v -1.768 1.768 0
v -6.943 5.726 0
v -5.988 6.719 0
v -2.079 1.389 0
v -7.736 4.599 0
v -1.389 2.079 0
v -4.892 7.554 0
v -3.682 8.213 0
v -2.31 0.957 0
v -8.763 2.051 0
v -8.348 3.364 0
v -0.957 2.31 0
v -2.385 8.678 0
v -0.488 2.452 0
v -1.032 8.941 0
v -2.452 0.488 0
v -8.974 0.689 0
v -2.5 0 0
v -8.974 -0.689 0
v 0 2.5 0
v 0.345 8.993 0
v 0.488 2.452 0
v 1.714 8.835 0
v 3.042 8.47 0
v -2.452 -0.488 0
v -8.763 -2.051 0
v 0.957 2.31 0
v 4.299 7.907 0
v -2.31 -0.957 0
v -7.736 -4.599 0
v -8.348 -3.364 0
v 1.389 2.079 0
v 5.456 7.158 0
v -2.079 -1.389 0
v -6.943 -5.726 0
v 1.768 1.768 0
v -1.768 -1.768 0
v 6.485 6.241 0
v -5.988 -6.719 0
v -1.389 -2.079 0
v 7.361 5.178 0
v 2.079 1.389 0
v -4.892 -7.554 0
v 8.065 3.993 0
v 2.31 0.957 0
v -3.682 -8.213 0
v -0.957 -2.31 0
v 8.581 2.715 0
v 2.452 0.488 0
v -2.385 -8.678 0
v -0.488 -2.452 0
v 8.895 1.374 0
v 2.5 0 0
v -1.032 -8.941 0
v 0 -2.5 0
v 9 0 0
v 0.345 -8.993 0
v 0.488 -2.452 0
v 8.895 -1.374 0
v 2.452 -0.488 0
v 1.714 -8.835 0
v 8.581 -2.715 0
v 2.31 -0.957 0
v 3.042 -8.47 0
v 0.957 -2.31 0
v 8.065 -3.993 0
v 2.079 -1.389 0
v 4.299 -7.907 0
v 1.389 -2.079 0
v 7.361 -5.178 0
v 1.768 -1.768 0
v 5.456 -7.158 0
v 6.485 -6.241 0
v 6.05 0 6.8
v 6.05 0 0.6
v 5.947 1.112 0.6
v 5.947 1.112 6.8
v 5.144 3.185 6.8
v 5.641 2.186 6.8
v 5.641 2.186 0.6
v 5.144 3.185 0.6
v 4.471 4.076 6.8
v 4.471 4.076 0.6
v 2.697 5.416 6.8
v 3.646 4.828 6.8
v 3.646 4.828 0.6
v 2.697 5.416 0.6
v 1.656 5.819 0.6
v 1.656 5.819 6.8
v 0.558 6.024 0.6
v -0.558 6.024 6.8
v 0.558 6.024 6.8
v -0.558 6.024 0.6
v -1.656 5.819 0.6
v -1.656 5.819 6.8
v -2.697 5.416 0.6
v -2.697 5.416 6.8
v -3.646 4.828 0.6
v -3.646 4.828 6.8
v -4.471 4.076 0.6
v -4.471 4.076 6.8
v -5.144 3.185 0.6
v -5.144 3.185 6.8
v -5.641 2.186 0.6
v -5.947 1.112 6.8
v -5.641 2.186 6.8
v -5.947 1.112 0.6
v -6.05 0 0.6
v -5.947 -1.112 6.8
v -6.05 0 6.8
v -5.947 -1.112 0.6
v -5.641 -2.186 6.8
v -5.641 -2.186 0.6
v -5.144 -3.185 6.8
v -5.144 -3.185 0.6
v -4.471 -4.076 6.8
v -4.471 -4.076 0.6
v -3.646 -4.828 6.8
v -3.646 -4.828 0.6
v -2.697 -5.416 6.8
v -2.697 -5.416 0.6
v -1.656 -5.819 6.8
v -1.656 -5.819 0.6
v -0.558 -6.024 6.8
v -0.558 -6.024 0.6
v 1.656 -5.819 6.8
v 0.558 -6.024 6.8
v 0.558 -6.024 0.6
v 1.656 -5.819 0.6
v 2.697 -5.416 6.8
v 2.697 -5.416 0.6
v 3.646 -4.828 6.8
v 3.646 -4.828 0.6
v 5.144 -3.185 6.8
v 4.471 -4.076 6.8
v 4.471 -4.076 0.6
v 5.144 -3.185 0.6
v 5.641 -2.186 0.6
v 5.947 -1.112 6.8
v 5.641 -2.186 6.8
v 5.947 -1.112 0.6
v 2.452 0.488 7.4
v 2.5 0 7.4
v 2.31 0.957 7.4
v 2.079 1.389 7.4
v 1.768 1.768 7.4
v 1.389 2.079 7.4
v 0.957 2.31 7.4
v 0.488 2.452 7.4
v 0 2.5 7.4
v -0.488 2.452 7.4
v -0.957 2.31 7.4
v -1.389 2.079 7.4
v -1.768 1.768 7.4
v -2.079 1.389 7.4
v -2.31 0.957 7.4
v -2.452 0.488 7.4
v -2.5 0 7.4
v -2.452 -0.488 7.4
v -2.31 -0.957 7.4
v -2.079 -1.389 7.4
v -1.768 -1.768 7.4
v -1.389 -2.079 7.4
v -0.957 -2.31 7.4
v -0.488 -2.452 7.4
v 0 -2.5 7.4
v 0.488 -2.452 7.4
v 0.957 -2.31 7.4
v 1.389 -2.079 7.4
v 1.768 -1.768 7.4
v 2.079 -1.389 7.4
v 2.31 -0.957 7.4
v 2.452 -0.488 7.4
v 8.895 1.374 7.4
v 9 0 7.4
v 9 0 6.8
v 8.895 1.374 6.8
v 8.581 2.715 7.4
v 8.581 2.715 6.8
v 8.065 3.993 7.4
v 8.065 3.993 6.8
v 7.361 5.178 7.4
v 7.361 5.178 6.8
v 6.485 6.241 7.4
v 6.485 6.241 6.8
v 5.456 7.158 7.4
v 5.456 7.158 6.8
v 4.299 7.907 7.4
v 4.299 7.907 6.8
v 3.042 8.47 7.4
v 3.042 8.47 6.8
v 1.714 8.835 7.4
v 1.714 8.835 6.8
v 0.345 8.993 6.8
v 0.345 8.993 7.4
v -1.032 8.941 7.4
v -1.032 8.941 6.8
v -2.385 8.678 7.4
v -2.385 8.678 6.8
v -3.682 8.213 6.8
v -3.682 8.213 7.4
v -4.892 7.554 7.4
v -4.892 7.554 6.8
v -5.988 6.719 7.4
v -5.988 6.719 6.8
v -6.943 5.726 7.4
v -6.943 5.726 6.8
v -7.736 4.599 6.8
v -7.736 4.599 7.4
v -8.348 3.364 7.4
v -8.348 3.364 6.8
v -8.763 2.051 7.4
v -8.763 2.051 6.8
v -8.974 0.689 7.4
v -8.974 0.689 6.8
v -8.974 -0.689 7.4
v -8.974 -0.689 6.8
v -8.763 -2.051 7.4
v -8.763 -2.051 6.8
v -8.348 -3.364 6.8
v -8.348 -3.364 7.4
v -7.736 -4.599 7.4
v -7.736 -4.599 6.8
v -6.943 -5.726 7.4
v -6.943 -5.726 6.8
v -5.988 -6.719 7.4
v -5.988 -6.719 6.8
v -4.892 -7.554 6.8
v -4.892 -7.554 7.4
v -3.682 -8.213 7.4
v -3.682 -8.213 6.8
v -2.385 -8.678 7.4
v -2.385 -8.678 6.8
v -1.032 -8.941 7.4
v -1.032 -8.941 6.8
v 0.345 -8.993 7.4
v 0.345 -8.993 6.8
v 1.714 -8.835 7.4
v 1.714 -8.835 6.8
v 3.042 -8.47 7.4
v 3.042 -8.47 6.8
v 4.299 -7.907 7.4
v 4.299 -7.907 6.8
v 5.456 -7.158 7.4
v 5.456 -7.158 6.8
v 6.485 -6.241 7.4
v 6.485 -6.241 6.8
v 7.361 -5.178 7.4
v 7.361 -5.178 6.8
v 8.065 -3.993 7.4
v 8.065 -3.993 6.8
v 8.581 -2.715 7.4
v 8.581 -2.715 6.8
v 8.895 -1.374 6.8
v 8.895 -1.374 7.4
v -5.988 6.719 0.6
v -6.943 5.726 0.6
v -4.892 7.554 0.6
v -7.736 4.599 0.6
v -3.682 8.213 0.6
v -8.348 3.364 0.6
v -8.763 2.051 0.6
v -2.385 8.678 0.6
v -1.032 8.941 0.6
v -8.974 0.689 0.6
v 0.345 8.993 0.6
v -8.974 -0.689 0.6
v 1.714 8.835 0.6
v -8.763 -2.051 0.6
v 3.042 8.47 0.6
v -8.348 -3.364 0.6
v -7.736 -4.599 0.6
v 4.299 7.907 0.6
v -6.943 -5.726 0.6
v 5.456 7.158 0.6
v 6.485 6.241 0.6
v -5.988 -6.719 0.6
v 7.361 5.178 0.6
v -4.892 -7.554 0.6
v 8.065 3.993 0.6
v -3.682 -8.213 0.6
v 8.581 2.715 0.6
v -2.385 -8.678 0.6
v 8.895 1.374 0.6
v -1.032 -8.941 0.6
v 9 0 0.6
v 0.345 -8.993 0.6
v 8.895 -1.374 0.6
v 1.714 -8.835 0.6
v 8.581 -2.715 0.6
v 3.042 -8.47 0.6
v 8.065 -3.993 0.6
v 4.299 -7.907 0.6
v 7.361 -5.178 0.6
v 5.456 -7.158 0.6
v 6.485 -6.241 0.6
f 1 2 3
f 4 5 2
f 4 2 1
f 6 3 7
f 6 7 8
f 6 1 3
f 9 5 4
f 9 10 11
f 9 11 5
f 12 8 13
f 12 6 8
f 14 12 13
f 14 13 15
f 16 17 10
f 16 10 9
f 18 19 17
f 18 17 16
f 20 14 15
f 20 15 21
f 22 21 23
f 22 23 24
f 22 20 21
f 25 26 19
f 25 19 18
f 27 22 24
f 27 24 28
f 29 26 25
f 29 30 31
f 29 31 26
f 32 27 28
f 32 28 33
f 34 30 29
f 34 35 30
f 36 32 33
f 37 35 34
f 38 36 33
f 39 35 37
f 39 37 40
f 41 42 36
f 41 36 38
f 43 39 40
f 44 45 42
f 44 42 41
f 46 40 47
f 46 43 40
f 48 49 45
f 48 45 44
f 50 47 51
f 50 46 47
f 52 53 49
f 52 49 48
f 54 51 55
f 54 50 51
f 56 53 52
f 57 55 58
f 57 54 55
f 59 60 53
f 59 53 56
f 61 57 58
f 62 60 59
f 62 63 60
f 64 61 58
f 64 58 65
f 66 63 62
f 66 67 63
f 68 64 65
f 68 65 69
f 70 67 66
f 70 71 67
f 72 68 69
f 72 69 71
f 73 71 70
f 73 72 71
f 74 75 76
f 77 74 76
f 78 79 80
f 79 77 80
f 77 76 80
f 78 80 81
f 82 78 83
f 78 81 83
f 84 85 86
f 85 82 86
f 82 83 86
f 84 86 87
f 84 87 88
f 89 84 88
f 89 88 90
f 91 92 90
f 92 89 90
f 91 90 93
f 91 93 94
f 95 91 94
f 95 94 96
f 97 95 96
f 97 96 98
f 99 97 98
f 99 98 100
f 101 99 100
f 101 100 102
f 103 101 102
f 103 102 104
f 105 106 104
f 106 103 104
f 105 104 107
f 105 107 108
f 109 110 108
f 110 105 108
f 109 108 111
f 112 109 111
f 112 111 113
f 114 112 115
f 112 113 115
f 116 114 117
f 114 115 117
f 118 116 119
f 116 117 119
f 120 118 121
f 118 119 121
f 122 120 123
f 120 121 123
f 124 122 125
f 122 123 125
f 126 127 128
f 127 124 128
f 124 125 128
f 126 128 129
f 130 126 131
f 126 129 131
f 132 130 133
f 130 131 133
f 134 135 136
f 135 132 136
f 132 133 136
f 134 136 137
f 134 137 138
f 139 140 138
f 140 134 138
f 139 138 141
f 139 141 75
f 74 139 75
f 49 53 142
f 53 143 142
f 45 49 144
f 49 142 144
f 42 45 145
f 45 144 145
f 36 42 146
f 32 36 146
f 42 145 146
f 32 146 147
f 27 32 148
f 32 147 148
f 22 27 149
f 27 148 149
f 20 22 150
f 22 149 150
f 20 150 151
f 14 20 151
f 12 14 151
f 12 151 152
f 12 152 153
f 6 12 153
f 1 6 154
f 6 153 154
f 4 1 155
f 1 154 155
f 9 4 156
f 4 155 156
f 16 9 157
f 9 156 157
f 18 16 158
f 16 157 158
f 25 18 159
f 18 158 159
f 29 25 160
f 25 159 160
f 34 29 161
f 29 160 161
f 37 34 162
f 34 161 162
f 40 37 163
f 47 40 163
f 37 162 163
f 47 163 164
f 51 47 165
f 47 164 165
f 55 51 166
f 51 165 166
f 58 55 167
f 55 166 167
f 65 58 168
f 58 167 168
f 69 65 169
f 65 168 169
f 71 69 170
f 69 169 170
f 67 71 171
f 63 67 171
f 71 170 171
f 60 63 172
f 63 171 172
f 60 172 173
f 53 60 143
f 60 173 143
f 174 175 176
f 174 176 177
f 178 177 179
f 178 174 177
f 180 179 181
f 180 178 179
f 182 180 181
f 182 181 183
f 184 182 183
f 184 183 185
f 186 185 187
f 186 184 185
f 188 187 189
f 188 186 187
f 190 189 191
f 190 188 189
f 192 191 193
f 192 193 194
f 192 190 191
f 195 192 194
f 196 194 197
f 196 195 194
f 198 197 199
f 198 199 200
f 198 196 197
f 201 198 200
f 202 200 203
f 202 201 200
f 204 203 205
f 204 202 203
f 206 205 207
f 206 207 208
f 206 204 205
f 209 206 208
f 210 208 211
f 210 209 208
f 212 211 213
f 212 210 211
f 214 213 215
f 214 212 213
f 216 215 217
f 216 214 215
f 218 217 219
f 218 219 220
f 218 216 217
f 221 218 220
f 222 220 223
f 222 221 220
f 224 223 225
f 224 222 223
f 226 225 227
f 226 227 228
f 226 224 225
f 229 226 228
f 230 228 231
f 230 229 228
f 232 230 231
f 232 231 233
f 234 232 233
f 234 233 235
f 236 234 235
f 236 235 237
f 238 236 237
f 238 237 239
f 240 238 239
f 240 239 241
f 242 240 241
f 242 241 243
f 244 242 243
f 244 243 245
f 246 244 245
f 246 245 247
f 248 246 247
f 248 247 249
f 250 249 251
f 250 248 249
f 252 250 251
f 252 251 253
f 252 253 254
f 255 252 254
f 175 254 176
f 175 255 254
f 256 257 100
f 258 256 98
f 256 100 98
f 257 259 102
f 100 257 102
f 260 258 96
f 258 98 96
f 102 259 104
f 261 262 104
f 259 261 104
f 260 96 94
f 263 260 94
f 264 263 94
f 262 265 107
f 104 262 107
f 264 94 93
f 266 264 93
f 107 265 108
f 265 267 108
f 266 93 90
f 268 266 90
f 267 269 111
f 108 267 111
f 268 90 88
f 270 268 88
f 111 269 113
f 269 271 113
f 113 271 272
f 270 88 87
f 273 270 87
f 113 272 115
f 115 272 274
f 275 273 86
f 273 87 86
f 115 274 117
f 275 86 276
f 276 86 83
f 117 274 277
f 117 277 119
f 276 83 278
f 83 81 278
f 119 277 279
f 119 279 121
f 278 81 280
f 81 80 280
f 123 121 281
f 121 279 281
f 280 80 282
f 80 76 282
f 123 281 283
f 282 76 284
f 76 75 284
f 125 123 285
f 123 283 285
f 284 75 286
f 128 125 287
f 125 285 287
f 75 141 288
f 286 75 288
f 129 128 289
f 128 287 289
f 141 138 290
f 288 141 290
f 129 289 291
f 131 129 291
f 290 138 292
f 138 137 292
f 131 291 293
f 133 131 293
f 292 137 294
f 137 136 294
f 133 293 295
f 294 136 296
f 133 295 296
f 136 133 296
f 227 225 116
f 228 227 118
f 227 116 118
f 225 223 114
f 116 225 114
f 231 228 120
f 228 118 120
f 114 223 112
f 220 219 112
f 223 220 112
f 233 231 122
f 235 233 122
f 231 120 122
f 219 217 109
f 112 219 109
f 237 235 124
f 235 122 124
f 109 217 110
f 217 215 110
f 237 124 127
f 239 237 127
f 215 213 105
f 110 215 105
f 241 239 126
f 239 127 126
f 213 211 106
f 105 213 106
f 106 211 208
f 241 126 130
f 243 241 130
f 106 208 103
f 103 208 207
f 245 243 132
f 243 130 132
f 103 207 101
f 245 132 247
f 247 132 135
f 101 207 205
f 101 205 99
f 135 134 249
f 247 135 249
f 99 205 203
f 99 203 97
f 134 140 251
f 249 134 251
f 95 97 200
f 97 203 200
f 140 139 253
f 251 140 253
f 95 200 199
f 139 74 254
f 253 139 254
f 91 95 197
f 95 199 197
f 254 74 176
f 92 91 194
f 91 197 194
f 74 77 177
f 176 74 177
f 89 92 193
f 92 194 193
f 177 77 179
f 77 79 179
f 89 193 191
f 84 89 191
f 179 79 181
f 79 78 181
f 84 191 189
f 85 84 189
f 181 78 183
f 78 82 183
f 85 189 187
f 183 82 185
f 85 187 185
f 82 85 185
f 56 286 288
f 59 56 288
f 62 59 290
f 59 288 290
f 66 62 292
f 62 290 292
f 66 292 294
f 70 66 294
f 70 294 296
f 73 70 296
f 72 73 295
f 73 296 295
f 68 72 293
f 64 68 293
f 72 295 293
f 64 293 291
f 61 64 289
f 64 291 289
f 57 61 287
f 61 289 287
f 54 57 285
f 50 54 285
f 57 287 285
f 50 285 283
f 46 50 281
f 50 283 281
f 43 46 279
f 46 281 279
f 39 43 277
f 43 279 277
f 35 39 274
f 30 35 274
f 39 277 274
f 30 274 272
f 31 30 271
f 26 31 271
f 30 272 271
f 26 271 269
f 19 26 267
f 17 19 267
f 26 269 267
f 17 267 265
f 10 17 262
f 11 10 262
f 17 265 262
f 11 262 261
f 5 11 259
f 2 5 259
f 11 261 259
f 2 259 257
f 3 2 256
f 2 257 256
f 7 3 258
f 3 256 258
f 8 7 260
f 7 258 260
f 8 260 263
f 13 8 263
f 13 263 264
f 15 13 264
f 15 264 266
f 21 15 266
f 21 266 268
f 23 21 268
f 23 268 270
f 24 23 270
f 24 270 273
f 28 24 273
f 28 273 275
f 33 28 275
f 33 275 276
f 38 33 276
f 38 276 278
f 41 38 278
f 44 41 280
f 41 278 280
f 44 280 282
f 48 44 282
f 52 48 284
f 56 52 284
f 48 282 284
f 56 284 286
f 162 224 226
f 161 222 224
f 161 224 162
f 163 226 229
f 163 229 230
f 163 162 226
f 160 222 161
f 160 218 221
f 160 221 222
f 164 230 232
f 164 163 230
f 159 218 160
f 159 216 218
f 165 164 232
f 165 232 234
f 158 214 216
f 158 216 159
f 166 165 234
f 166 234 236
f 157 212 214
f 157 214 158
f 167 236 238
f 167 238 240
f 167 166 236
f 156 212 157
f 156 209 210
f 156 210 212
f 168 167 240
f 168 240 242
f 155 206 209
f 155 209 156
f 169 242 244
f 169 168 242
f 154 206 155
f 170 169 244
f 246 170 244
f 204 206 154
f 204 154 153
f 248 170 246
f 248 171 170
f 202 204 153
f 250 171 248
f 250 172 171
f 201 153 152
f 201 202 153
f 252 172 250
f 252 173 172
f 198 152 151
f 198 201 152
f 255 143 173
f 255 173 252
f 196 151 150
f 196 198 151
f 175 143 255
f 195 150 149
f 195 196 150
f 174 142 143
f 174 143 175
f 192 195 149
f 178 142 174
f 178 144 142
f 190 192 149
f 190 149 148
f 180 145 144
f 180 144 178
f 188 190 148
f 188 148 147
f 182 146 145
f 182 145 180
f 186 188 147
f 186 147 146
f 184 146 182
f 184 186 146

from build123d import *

# Parameters (mm, degrees)
SKETCH_1_R          = 6.05
SKETCH_1_R_2        = 2.5
EXTRUDE_1_DEPTH     = 7.4
SKETCH_2_R          = 9
EXTRUDE_2_DEPTH     = 0.6
EXTRUDE_START       = -0.6
SKETCH_3_R          = 9
EXTRUDE_3_DEPTH     = 0.6
SKETCH_4_R          = 2.5
CUT_EXTRUDE_1_DEPTH = 15.722771478


with BuildPart() as part:
    # Эскиз1 → Бобышка-Вытянуть1 (new body)
    with BuildSketch(Plane.XY):
        Circle(SKETCH_1_R)
        Circle(SKETCH_1_R_2, mode=Mode.SUBTRACT)
    extrude(amount=EXTRUDE_1_DEPTH)

    # Эскиз2 → Бобышка-Вытянуть2 (add)
    with BuildSketch(Plane.XY.offset(7.4)):
        Circle(SKETCH_2_R)
    extrude(amount=-EXTRUDE_2_DEPTH)

    # Эскиз3 → Бобышка-Вытянуть3 (add)
    with BuildSketch(Plane(origin=(0, 0, 0), x_dir=(-1, 0, 0), z_dir=(0, 0, -1)).offset(EXTRUDE_START)):
        with Locations(Location((0, 0, 0), (0, 0, 180))):
            Circle(SKETCH_3_R)
    extrude(amount=EXTRUDE_3_DEPTH)

    # Эскиз4 → Вырез-Вытянуть1 (cut, through all)
    with BuildSketch(Plane.XY.offset(7.4)):
        Circle(SKETCH_4_R)
    extrude(amount=-CUT_EXTRUDE_1_DEPTH, mode=Mode.SUBTRACT)


solid = part.part
